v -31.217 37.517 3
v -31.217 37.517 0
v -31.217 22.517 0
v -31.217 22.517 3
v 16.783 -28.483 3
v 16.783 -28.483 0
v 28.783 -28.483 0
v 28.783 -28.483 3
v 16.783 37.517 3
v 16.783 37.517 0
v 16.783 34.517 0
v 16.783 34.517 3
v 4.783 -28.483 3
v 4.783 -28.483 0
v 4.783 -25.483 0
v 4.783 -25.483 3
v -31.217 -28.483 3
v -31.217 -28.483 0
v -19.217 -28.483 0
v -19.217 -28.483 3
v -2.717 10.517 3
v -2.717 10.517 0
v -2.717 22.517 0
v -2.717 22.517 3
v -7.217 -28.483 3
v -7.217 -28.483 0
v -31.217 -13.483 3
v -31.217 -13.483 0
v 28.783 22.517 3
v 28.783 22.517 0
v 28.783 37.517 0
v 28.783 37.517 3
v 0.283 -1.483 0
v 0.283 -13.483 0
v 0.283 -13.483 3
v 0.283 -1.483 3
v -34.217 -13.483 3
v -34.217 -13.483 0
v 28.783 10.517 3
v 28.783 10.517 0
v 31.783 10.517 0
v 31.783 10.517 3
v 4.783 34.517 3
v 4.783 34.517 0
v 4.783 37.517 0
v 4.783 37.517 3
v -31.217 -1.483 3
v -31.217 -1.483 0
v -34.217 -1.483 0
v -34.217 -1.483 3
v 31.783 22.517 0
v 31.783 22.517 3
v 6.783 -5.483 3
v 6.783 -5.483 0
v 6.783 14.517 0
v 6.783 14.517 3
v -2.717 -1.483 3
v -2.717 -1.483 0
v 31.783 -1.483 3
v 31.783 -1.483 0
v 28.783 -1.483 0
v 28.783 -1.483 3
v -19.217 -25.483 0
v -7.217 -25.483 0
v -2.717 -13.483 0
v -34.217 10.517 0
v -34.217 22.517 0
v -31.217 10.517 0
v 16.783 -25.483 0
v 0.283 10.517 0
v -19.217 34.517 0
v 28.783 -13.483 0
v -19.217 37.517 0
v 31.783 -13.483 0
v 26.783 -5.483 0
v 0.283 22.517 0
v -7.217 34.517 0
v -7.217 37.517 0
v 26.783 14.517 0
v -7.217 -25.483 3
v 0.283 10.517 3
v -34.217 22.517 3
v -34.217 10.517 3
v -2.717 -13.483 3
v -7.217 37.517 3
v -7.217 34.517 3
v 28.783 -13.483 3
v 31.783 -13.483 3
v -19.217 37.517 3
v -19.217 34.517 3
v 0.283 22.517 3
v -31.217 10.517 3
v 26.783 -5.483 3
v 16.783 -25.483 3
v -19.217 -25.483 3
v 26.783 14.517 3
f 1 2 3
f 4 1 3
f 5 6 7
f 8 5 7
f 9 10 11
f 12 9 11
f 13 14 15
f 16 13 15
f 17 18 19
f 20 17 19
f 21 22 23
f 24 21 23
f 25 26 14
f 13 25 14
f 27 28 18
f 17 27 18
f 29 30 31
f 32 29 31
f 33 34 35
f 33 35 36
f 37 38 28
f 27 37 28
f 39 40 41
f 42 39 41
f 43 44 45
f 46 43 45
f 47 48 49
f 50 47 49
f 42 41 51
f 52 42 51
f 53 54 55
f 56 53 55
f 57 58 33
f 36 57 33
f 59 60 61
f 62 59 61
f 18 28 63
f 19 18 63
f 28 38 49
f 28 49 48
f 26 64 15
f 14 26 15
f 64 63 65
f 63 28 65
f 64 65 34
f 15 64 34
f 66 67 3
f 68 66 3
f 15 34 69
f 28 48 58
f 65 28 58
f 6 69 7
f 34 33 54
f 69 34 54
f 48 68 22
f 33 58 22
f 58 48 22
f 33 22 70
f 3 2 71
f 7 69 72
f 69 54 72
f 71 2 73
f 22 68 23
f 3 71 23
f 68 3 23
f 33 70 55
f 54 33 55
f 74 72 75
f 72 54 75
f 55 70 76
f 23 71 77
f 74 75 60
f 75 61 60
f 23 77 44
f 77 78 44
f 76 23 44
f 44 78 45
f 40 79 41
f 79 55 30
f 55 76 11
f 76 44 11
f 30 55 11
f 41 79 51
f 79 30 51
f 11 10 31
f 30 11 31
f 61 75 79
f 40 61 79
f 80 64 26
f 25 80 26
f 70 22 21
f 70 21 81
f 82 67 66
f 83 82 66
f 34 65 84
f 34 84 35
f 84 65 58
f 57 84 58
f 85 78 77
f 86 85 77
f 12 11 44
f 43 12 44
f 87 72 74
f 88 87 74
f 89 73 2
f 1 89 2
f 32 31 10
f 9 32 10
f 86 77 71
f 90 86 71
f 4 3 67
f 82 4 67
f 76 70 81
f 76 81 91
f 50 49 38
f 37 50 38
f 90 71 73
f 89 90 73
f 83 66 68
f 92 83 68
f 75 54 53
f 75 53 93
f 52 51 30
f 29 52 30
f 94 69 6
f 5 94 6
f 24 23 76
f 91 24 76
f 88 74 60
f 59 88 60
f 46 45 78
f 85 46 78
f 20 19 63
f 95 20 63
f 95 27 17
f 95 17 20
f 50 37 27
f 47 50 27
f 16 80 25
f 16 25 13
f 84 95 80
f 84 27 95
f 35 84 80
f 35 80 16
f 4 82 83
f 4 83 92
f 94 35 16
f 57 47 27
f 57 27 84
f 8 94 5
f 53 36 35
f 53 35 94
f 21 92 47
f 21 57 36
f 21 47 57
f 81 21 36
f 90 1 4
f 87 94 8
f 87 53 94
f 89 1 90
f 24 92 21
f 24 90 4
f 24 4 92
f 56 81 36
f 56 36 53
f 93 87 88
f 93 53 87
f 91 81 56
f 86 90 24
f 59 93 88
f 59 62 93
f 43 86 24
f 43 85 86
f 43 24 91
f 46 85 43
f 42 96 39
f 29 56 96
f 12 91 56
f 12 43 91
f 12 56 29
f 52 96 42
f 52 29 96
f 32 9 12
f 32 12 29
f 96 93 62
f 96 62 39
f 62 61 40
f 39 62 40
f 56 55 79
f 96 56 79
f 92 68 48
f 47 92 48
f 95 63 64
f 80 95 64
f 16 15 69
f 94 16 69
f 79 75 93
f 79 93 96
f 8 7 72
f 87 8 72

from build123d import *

# Parameters (mm, degrees)
ESBO_O1_W                = 3
ESBO_O1_H                = 12
ESBO_O1_W_2              = 20
ESBO_O1_H_2              = 20
RESSALTO_EXTRUS_O1_DEPTH = 3


with BuildPart() as part:
    # Esboço1 → Ressalto-extrusão1 (new body)
    with BuildSketch(Plane.XY):
        Polygon((-31.216896784, 10.517052385), (-31.216896784, -1.482947615), (-34.216896784, -1.482947615), (-34.216896784, -13.482947615), (-31.216896784, -13.482947615), (-31.216896784, -25.482947615), (-31.216896784, -28.482947615), (-19.216896784, -28.482947615), (-19.216896784, -25.482947615), (-7.216896784, -25.482947615), (-7.216896784, -28.482947615), (4.783103216, -28.482947615), (4.783103216, -25.482947615), (16.783103216, -25.482947615), (16.783103216, -28.482947615), (28.783103216, -28.482947615), (28.783103216, -25.482947615), (28.783103216, -13.482947615), (31.783103216, -13.482947615), (31.783103216, -1.482947615), (28.783103216, -1.482947615), (28.783103216, 10.517052385), (31.783103216, 10.517052385), (31.783103216, 22.517052385), (28.783103216, 22.517052385), (28.783103216, 34.517052385), (28.783103216, 37.517052385), (16.783103216, 37.517052385), (16.783103216, 34.517052385), (4.783103216, 34.517052385), (4.783103216, 37.517052385), (-7.216896784, 37.517052385), (-7.216896784, 34.517052385), (-19.216896784, 34.517052385), (-19.216896784, 37.517052385), (-31.216896784, 37.517052385), (-31.216896784, 34.517052385), (-31.216896784, 22.517052385), (-34.216896784, 22.517052385), (-34.216896784, 10.517052385), align=None)
        with Locations((-1.216896784, 16.517052385)):
            Rectangle(ESBO_O1_W, ESBO_O1_H, mode=Mode.SUBTRACT)
        with Locations((-1.216896784, -7.482947615)):
            Rectangle(ESBO_O1_W, ESBO_O1_H, mode=Mode.SUBTRACT)
        with Locations((16.783103216, 4.517052385)):
            Rectangle(ESBO_O1_W_2, ESBO_O1_H_2, mode=Mode.SUBTRACT)
    extrude(amount=RESSALTO_EXTRUS_O1_DEPTH)


solid = part.part
